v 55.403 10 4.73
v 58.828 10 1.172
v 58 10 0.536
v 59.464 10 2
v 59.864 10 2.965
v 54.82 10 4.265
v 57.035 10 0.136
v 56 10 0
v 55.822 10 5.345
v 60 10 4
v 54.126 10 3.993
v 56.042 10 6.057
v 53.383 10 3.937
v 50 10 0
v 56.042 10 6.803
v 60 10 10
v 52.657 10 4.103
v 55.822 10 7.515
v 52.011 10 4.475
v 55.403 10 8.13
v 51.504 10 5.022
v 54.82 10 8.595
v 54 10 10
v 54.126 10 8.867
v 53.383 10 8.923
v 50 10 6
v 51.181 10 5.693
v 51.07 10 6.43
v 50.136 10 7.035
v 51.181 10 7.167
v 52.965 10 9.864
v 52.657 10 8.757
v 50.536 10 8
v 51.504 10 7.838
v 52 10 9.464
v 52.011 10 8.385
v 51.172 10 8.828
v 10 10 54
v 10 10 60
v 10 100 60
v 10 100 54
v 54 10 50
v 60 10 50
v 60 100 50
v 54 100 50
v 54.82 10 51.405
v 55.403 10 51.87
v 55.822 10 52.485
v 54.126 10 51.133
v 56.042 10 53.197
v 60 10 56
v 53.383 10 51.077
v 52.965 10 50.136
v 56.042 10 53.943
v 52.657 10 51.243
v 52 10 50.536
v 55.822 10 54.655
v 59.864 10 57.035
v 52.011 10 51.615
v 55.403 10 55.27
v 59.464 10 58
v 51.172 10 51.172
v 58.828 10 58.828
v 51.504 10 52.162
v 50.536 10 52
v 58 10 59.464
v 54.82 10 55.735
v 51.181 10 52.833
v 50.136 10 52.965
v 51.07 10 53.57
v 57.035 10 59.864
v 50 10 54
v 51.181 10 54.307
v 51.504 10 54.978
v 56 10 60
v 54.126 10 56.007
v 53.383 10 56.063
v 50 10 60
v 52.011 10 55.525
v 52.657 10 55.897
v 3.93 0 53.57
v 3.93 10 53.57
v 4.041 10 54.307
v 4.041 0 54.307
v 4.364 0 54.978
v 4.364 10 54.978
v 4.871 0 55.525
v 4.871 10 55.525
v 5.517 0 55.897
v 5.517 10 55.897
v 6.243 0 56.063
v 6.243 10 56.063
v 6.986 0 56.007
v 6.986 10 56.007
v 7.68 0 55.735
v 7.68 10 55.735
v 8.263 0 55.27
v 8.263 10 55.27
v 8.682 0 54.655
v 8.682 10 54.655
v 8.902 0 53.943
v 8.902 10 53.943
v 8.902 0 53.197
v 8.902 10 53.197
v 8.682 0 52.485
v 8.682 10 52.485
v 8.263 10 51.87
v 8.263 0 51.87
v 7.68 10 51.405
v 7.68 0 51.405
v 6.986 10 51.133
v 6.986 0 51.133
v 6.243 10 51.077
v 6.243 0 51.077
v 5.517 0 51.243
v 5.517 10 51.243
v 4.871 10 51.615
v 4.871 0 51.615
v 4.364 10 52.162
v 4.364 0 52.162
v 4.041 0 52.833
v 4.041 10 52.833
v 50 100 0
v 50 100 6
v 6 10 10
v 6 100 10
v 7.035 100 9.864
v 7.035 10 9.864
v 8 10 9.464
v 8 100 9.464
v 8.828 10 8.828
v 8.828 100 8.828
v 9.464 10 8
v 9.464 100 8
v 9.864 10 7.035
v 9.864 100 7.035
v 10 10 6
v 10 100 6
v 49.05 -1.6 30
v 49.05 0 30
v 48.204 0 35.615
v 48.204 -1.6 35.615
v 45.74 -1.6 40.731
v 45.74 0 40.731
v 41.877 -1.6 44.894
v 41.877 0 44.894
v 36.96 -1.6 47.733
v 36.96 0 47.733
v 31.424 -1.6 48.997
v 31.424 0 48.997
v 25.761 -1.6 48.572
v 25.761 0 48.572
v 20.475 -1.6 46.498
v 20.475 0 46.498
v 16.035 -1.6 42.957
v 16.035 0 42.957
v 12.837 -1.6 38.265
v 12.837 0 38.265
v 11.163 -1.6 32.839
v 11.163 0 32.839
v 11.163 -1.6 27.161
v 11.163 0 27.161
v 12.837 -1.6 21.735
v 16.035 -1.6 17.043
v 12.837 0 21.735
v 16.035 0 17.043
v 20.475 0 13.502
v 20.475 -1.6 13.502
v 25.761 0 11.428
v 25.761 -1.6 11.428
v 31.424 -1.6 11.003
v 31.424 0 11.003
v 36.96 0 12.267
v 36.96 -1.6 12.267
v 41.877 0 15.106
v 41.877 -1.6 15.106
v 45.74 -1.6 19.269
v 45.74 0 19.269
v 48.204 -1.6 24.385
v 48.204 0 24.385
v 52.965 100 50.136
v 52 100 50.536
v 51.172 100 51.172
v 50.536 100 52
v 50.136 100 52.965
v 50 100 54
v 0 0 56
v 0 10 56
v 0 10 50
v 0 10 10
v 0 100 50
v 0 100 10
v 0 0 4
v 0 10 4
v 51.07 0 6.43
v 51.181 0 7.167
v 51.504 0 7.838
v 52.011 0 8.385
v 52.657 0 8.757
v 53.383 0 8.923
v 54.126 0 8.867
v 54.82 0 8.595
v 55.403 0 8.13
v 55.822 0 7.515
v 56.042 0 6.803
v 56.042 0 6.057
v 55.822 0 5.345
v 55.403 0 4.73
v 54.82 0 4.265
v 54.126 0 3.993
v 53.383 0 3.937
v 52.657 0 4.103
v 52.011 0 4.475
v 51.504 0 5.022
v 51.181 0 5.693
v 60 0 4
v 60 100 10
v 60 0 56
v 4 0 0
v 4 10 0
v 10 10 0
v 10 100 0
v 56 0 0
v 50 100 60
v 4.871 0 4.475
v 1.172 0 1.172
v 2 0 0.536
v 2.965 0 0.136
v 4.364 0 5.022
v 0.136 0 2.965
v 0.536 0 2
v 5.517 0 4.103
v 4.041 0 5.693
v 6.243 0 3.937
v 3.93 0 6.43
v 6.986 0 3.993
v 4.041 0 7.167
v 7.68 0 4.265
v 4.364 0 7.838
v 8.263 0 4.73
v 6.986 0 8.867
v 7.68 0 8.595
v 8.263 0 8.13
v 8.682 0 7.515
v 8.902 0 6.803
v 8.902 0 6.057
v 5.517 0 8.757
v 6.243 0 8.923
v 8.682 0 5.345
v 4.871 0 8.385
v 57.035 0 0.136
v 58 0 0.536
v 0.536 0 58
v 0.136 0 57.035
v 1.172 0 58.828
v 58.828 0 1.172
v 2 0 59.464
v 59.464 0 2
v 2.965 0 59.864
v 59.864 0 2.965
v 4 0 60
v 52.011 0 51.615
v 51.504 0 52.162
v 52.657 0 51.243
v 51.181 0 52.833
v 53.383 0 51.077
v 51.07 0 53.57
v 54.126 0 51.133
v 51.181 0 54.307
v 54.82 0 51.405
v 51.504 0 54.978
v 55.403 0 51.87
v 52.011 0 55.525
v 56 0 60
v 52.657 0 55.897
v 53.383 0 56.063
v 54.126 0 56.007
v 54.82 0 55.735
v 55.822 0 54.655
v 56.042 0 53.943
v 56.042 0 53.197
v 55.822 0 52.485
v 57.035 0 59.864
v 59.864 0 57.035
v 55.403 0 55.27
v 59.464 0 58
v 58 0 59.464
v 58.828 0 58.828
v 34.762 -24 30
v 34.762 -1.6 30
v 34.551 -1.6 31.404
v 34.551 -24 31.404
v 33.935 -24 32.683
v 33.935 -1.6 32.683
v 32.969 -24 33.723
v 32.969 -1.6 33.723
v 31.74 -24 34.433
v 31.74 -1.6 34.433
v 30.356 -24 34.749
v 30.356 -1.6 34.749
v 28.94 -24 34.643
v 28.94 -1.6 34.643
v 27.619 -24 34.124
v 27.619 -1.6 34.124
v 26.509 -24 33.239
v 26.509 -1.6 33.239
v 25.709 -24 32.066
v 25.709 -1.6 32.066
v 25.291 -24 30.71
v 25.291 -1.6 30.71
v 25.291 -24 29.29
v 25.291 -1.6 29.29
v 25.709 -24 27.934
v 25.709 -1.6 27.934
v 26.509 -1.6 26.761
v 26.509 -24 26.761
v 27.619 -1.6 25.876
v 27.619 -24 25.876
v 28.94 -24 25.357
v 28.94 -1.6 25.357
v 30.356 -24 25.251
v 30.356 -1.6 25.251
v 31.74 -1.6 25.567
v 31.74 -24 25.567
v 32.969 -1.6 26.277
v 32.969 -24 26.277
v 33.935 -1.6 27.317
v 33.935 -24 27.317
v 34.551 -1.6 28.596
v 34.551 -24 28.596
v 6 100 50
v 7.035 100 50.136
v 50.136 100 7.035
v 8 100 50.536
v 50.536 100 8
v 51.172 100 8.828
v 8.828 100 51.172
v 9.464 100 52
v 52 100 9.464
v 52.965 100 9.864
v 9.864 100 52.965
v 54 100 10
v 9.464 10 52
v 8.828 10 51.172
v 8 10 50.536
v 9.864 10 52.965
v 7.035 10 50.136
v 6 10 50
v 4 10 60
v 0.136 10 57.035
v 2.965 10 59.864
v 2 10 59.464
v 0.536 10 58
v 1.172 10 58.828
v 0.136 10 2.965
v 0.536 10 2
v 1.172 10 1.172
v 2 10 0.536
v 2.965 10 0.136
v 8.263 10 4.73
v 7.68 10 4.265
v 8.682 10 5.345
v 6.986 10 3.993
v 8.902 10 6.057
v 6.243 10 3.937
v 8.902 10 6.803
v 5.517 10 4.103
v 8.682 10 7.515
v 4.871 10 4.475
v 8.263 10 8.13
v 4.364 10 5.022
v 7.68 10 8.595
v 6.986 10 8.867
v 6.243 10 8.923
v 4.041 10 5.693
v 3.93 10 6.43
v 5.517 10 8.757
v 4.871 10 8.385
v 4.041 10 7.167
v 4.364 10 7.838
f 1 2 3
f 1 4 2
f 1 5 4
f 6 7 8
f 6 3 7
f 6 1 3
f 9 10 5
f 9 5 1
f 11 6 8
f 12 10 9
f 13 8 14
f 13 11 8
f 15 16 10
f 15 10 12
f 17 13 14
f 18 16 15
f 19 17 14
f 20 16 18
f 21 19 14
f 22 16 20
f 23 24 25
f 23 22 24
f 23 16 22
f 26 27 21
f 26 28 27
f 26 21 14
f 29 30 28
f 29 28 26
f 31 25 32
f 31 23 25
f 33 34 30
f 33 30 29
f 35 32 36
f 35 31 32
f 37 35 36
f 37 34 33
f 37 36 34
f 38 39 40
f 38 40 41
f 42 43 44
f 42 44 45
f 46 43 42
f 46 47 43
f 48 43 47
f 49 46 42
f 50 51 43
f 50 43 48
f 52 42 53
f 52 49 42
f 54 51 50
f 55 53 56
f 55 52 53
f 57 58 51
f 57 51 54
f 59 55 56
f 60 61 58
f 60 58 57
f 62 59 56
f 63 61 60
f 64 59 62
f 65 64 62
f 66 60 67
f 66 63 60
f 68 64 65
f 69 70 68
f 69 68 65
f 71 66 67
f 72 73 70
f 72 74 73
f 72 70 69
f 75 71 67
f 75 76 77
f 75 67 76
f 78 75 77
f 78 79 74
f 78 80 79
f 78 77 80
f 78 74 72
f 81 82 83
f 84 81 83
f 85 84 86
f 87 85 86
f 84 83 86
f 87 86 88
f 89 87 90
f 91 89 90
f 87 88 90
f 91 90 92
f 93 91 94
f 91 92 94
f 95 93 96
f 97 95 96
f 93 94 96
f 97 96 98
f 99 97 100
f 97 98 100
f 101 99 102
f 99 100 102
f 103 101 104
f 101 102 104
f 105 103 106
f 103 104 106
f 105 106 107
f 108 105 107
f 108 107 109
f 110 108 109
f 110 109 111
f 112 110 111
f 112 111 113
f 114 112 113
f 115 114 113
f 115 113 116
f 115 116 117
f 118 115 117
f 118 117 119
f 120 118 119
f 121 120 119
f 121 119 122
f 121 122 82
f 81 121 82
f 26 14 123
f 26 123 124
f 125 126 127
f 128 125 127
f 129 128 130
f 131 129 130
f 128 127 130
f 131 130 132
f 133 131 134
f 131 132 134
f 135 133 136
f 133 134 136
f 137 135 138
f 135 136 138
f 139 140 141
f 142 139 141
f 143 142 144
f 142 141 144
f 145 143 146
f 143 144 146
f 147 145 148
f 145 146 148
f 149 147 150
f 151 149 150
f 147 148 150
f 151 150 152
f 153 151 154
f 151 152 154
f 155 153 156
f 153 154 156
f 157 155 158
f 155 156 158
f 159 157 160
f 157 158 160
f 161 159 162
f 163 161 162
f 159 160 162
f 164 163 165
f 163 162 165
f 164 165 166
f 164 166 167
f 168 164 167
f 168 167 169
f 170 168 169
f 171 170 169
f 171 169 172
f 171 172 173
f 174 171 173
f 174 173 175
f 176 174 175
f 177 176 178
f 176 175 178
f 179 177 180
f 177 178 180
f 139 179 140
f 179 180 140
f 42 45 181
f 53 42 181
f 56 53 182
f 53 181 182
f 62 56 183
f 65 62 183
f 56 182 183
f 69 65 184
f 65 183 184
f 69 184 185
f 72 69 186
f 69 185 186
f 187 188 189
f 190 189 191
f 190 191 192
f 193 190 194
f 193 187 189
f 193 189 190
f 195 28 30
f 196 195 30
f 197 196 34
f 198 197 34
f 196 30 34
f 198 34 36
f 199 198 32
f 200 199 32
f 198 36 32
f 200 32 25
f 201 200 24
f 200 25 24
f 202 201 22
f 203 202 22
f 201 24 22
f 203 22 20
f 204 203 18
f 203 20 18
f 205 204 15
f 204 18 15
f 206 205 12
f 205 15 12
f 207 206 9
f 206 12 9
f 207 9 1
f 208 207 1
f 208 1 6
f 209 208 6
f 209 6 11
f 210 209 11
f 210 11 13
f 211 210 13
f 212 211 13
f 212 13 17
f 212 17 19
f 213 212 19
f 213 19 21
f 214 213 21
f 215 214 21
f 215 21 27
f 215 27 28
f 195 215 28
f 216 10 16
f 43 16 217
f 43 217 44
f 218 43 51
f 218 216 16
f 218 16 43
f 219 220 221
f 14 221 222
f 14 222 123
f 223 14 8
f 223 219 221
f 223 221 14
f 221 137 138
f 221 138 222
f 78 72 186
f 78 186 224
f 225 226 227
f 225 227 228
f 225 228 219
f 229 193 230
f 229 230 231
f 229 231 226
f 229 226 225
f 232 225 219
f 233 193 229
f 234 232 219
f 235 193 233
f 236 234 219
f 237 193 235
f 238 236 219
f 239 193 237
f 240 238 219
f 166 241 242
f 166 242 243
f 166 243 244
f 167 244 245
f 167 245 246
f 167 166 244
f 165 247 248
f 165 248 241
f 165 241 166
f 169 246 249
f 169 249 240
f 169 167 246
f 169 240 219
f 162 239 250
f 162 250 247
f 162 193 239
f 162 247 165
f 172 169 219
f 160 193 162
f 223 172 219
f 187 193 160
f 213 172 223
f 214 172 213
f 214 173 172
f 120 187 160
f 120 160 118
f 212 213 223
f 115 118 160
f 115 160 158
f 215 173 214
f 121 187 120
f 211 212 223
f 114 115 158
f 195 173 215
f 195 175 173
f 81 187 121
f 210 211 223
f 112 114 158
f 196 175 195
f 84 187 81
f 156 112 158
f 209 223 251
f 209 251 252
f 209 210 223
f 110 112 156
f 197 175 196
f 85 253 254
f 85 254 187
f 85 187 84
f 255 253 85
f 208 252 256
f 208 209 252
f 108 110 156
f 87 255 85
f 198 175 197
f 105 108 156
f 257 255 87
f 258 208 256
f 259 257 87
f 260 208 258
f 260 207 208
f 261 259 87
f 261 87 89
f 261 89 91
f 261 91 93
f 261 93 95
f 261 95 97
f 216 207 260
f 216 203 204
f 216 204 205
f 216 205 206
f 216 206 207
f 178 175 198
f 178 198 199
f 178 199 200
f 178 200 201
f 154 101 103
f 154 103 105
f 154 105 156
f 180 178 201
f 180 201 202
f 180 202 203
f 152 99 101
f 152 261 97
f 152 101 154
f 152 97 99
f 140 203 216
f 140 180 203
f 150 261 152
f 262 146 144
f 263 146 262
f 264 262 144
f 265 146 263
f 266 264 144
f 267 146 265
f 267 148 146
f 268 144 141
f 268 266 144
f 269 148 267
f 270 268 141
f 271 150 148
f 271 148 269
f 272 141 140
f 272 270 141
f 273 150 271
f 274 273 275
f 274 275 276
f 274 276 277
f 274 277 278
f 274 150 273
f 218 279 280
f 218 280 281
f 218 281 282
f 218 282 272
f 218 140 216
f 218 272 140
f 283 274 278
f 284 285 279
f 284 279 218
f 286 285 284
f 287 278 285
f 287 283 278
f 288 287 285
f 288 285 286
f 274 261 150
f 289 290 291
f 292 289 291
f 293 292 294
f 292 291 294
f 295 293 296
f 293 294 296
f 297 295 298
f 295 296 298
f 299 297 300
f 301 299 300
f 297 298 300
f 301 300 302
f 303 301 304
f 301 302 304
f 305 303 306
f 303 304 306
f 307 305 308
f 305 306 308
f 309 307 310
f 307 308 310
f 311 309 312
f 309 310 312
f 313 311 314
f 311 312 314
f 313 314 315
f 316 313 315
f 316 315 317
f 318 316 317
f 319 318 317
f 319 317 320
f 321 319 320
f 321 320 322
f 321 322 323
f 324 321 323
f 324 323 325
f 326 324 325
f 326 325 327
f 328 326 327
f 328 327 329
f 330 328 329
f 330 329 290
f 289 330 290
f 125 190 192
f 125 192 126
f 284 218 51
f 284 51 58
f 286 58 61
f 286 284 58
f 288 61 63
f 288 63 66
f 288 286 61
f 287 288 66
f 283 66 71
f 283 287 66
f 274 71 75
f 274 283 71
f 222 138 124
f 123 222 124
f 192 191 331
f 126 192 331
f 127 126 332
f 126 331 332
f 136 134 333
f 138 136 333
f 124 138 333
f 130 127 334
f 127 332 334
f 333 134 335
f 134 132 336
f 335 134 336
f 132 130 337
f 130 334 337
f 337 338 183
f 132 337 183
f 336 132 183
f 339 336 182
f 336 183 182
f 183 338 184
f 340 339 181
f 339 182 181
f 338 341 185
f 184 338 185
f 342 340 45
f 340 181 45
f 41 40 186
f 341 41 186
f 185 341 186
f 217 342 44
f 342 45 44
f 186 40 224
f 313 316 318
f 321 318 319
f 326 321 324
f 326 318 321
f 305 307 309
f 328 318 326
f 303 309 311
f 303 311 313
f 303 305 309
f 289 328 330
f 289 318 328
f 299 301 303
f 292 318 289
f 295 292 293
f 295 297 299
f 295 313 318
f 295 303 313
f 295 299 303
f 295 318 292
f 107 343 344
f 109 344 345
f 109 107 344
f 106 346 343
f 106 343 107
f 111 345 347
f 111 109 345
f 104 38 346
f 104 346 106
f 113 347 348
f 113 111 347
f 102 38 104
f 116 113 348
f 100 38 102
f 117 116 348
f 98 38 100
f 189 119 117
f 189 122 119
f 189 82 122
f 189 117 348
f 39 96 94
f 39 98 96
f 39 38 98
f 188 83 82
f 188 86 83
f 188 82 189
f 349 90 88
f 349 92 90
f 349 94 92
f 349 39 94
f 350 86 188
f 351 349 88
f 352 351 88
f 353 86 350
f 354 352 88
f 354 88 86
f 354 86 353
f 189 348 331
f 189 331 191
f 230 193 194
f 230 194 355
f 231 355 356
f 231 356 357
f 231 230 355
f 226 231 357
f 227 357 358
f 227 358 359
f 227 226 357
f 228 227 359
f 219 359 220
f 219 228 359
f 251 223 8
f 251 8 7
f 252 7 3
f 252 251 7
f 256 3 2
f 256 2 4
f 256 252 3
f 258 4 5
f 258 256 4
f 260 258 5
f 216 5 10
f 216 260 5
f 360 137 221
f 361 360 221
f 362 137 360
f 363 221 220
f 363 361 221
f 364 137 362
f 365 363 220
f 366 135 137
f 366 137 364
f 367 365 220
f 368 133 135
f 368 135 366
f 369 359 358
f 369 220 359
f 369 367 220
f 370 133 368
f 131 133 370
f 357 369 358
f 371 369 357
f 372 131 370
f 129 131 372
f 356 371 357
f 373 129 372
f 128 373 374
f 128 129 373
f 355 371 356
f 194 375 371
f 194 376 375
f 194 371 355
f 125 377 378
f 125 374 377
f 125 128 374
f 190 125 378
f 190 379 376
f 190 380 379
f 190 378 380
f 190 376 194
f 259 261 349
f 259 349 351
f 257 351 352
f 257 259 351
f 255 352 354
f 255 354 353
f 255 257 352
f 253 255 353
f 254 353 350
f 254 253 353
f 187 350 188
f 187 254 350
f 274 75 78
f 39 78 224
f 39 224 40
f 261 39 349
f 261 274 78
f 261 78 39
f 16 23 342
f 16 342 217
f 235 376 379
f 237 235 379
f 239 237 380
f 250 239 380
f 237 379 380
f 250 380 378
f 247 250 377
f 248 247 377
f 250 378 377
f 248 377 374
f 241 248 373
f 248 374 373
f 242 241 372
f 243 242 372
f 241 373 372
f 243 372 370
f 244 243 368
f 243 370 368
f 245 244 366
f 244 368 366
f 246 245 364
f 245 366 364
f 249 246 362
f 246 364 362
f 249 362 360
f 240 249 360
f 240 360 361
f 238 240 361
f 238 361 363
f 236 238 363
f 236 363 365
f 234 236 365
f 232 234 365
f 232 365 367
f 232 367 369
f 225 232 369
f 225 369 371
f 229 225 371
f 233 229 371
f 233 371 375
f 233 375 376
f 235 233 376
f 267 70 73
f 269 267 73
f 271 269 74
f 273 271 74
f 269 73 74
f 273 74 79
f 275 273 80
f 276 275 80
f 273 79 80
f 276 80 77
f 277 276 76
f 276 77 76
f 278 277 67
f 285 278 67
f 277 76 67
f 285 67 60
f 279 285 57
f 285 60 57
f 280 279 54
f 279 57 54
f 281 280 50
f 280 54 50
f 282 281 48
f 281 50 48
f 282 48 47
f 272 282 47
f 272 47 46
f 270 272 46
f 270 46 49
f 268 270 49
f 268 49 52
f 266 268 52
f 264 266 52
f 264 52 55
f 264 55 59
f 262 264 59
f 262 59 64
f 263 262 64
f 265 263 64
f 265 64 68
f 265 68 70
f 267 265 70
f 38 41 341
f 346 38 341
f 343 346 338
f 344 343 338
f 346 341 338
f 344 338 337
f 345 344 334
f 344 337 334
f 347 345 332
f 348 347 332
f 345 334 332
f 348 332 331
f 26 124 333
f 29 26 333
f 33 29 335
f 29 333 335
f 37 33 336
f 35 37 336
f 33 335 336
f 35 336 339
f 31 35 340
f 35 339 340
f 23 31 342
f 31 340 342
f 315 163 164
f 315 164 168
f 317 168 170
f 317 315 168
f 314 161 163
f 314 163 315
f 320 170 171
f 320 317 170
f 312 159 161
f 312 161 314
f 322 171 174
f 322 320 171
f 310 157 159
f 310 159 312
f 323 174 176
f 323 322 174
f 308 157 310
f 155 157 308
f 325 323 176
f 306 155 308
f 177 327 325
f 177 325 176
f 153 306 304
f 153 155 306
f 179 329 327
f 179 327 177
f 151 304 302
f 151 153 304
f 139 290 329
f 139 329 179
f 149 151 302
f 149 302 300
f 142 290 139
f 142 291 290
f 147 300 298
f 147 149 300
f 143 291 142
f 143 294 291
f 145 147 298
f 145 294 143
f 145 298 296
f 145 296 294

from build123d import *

# Parameters (mm, degrees)
F1_DEPTH = 10
F3_DEPTH = 1.6
F5_DEPTH = 24
F7_DEPTH = 90
F9_DEPTH = 90
F10_D    = 5


with BuildPart() as f1:
    # F0 (on Front) → F1 (new body)
    with BuildSketch(Plane.XZ):
        with BuildLine():
            ThreePointArc((0, 4), (1.1715728753, 1.1715728753), (4, 0))
            Line((4, 0), (56, 0))
            ThreePointArc((56, 0), (58.8284271247, 1.1715728753), (60, 4))
            Line((60, 4), (60, 56))
            ThreePointArc((60, 56), (58.8284271247, 58.8284271247), (56, 60))
            Line((56, 60), (4, 60))
            ThreePointArc((4, 60), (1.1715728753, 58.8284271247), (0, 56))
            Line((0, 56), (0, 4))
        make_face()
    extrude(amount=-F1_DEPTH)

    # F2 (on face) → F3 (join)
    with BuildSketch(Plane.XZ):
        with BuildLine():
            ThreePointArc((49.05, 30), (43.4703841816, 43.4703841816), (30, 49.05))
            Line((30, 49.05), (30, 10.95))
            ThreePointArc((30, 10.95), (43.4703841816, 16.5296158184), (49.05, 30))
        make_face()
        with BuildLine():
            Line((30, 10.95), (30, 49.05))
            ThreePointArc((30, 49.05), (10.95, 30), (30, 10.95))
        make_face()
    extrude(amount=F3_DEPTH)

    # F4 (on face) → F5 (join)
    with BuildSketch(Plane.XZ):
        with BuildLine():
            ThreePointArc((34.7625, 30), (33.3675960454, 33.3675960454), (30, 34.7625))
            Line((30, 34.7625), (30, 25.2375))
            ThreePointArc((30, 25.2375), (33.3675960454, 26.6324039546), (34.7625, 30))
        make_face()
        with BuildLine():
            Line((30, 25.2375), (30, 34.7625))
            ThreePointArc((30, 34.7625), (25.2375, 30), (30, 25.2375))
        make_face()
    extrude(amount=F5_DEPTH)

    # F7 (add): a face of the model
    f7_faces = [f1.faces().sort_by_distance(p)[0] for p in [
        (30, 10, 30),
    ]]
    extrude(f7_faces, amount=F7_DEPTH)

    # F8 (on face) → F9 (cut)
    with BuildSketch(Plane(origin=(0, 100, 0), x_dir=(-1, 0, 0), z_dir=(0, 1, 0))):
        with BuildLine():
            Line((-60, 50), (-54, 50))
            ThreePointArc((-54, 50), (-51.1715728753, 51.1715728753), (-50, 54))
            Line((-50, 54), (-50, 60))
            Line((-50, 60), (-60, 60))
            Line((-60, 60), (-60, 50))
        make_face()
        with BuildLine():
            ThreePointArc((-10, 54), (-8.8284271247, 51.1715728753), (-6, 50))
            Line((-6, 50), (0, 50))
            Line((0, 50), (0, 60))
            Line((0, 60), (-10, 60))
            Line((-10, 60), (-10, 54))
        make_face()
        with BuildLine():
            ThreePointArc((-50, 6), (-51.1715728753, 8.8284271247), (-54, 10))
            Line((-54, 10), (-60, 10))
            Line((-60, 10), (-60, 0))
            Line((-60, 0), (-50, 0))
            Line((-50, 0), (-50, 6))
        make_face()
        with BuildLine():
            Line((0, 10), (-6, 10))
            ThreePointArc((-6, 10), (-8.8284271247, 8.8284271247), (-10, 6))
            Line((-10, 6), (-10, 0))
            Line((-10, 0), (0, 0))
            Line((0, 0), (0, 10))
        make_face()
    extrude(amount=-F9_DEPTH, mode=Mode.SUBTRACT)

    # F10 (through all)
    with Locations(Plane.XZ):
        with Locations((6.43, 53.57), (53.57, 53.57), (53.57, 6.43), (6.43, 6.43)):
            Hole(F10_D / 2)


solid = f1.part
